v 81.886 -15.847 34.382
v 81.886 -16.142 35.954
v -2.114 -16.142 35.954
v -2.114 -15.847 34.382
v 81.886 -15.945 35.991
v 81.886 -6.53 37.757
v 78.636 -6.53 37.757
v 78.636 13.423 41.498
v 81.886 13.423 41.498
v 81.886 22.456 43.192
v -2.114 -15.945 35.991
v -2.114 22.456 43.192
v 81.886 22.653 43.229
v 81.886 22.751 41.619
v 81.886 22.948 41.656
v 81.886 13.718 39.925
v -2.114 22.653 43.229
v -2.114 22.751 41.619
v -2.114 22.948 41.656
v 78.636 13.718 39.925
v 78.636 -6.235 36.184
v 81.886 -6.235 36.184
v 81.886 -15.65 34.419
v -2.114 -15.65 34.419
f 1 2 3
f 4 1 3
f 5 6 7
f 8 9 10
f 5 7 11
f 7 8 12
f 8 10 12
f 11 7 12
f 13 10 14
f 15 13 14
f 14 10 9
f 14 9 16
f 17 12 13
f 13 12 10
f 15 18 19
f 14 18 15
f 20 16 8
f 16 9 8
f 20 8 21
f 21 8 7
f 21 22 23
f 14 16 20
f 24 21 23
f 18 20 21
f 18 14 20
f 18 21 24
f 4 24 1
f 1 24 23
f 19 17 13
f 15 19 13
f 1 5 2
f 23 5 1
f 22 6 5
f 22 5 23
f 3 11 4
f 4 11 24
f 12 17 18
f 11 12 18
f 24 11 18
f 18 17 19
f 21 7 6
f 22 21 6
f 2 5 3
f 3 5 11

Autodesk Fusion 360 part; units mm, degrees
sketch "Sketch1" plane through (0, -7.0615, 37.6569) normal (0, 0.1843, -0.9829) x (-1, 0, 0)
  line L0 (2.114, 30.6323) -> (-81.886, 30.6323)
  line L1 (-81.886, 30.6323) -> (-81.886, 20.8412)
  line L2 (-81.886, 20.8412) -> (-78.636, 20.8412)
  line L3 (-78.636, 20.8412) -> (-78.636, 28.8412)
  line L4 (-78.636, 28.8412) -> (-6.636, 28.8412)
  line L5 (-6.636, 28.8412) -> (-6.636, -7.4588)
  line L6 (-6.636, -7.4588) -> (-78.636, -7.4588)
  line L7 (-78.636, -7.4588) -> (-78.636, 0.5412)
  line L8 (-78.636, 0.5412) -> (-81.886, 0.5412)
  line L9 (-81.886, 0.5412) -> (-81.886, -10.9695)
  ellipse E0 centre (-79.886, -13.2445) end of major axis (-79.886, -16.2968) minor radius 3 (-76.9458, -12.6383) -> (-81.886, -10.9695) ccw
  line L10 (-76.9458, -12.6383) -> (-76.9458, -9.6383)
  line L11 (-76.9458, -9.6383) -> (-2.8262, -9.6383)
  line L12 (-2.8262, -9.6383) -> (-2.8262, -12.6383)
  ellipse E1 centre (0.114, -13.2445) end of major axis (0.114, -16.2968) minor radius 3 (2.114, -10.9695) -> (-2.8262, -12.6383) ccw
  line L13 (2.114, -10.9695) -> (2.114, 30.6323)
  line L14 (-78.636, 0.5412) -> (-78.636, -7.4588)
  line L15 (-78.636, -7.4588) -> (-6.636, -7.4588)
  line L16 (-6.636, -7.4588) -> (-6.636, 28.8412)
  line L17 (-6.636, 28.8412) -> (-78.636, 28.8412)
  line L18 (-78.636, 28.8412) -> (-78.636, 20.8412)
  line L19 (-78.636, 20.8412) -> (-81.886, 20.8412)
  line L20 (-81.886, 20.8412) -> (-81.886, 0.5412)
  line L21 (-81.886, 0.5412) -> (-78.636, 0.5412)
  line L22 (-70.636, 26.6912) -> (-9.136, 26.6912)
  line L23 (-9.136, 26.6912) -> (-9.136, -5.3088)
  line L24 (-9.136, -5.3088) -> (-70.636, -5.3088)
  line L25 (-70.636, -5.3088) -> (-70.636, 26.6912)
  line L26 (-76.9458, -9.6383) -> (-81.886, -9.6383)
  line L27 (-2.8262, -9.6383) -> (2.114, -9.6383)
  line L28 (-78.636, 20.8412) -> (-78.636, 0.5412)
extrude "Extrude1" add sketch "Sketch1" along normal blind 1.6 contours L0 L1 L2 L3 L4 L5 L6 L7 L8 L9 L11 L13 L14 L15 L16 L17 L18 L19 L21 L26 L27 | L3 L4 L5 L6 L7 L14 L15 L16 L17 L18 L28 | L22 L23 L24 L25
extrude "Extrude2" cut 1 faces at (53.886, 23.2426, 42.2544) along direction (0, -0.982868, -0.18431) blind 0.05
extrude "Extrude3" cut 1 faces at (53.886, -16.4364, 35.3563) along direction (0, 0.982868, 0.18431) blind 0.05
extrude "Extrude4" cut 1 faces at (53.886, 23.1934, 42.2452) along direction (0, -0.982868, -0.18431) blind 0.05
extrude "Extrude5" cut 1 faces at (53.886, -16.3873, 35.3655) along direction (0, 0.982868, 0.18431) blind 0.05
extrude "Extrude6" cut 1 faces at (53.886, -16.3382, 35.3747) along direction (0, 0.982868, 0.18431) blind 0.5
extrude "Extrude7" cut 1 faces at (53.886, 23.1443, 42.236) along direction (0, -0.982868, -0.18431) blind 0.5
extrude "Extrude8" add 1 faces at (53.886, 22.6528, 42.1438) along direction (0, 0.982868, 0.18431) blind 0.2
extrude "Extrude9" add 1 faces at (53.886, -15.8467, 35.4669) along direction (0, -0.982868, -0.18431) blind 0.2
